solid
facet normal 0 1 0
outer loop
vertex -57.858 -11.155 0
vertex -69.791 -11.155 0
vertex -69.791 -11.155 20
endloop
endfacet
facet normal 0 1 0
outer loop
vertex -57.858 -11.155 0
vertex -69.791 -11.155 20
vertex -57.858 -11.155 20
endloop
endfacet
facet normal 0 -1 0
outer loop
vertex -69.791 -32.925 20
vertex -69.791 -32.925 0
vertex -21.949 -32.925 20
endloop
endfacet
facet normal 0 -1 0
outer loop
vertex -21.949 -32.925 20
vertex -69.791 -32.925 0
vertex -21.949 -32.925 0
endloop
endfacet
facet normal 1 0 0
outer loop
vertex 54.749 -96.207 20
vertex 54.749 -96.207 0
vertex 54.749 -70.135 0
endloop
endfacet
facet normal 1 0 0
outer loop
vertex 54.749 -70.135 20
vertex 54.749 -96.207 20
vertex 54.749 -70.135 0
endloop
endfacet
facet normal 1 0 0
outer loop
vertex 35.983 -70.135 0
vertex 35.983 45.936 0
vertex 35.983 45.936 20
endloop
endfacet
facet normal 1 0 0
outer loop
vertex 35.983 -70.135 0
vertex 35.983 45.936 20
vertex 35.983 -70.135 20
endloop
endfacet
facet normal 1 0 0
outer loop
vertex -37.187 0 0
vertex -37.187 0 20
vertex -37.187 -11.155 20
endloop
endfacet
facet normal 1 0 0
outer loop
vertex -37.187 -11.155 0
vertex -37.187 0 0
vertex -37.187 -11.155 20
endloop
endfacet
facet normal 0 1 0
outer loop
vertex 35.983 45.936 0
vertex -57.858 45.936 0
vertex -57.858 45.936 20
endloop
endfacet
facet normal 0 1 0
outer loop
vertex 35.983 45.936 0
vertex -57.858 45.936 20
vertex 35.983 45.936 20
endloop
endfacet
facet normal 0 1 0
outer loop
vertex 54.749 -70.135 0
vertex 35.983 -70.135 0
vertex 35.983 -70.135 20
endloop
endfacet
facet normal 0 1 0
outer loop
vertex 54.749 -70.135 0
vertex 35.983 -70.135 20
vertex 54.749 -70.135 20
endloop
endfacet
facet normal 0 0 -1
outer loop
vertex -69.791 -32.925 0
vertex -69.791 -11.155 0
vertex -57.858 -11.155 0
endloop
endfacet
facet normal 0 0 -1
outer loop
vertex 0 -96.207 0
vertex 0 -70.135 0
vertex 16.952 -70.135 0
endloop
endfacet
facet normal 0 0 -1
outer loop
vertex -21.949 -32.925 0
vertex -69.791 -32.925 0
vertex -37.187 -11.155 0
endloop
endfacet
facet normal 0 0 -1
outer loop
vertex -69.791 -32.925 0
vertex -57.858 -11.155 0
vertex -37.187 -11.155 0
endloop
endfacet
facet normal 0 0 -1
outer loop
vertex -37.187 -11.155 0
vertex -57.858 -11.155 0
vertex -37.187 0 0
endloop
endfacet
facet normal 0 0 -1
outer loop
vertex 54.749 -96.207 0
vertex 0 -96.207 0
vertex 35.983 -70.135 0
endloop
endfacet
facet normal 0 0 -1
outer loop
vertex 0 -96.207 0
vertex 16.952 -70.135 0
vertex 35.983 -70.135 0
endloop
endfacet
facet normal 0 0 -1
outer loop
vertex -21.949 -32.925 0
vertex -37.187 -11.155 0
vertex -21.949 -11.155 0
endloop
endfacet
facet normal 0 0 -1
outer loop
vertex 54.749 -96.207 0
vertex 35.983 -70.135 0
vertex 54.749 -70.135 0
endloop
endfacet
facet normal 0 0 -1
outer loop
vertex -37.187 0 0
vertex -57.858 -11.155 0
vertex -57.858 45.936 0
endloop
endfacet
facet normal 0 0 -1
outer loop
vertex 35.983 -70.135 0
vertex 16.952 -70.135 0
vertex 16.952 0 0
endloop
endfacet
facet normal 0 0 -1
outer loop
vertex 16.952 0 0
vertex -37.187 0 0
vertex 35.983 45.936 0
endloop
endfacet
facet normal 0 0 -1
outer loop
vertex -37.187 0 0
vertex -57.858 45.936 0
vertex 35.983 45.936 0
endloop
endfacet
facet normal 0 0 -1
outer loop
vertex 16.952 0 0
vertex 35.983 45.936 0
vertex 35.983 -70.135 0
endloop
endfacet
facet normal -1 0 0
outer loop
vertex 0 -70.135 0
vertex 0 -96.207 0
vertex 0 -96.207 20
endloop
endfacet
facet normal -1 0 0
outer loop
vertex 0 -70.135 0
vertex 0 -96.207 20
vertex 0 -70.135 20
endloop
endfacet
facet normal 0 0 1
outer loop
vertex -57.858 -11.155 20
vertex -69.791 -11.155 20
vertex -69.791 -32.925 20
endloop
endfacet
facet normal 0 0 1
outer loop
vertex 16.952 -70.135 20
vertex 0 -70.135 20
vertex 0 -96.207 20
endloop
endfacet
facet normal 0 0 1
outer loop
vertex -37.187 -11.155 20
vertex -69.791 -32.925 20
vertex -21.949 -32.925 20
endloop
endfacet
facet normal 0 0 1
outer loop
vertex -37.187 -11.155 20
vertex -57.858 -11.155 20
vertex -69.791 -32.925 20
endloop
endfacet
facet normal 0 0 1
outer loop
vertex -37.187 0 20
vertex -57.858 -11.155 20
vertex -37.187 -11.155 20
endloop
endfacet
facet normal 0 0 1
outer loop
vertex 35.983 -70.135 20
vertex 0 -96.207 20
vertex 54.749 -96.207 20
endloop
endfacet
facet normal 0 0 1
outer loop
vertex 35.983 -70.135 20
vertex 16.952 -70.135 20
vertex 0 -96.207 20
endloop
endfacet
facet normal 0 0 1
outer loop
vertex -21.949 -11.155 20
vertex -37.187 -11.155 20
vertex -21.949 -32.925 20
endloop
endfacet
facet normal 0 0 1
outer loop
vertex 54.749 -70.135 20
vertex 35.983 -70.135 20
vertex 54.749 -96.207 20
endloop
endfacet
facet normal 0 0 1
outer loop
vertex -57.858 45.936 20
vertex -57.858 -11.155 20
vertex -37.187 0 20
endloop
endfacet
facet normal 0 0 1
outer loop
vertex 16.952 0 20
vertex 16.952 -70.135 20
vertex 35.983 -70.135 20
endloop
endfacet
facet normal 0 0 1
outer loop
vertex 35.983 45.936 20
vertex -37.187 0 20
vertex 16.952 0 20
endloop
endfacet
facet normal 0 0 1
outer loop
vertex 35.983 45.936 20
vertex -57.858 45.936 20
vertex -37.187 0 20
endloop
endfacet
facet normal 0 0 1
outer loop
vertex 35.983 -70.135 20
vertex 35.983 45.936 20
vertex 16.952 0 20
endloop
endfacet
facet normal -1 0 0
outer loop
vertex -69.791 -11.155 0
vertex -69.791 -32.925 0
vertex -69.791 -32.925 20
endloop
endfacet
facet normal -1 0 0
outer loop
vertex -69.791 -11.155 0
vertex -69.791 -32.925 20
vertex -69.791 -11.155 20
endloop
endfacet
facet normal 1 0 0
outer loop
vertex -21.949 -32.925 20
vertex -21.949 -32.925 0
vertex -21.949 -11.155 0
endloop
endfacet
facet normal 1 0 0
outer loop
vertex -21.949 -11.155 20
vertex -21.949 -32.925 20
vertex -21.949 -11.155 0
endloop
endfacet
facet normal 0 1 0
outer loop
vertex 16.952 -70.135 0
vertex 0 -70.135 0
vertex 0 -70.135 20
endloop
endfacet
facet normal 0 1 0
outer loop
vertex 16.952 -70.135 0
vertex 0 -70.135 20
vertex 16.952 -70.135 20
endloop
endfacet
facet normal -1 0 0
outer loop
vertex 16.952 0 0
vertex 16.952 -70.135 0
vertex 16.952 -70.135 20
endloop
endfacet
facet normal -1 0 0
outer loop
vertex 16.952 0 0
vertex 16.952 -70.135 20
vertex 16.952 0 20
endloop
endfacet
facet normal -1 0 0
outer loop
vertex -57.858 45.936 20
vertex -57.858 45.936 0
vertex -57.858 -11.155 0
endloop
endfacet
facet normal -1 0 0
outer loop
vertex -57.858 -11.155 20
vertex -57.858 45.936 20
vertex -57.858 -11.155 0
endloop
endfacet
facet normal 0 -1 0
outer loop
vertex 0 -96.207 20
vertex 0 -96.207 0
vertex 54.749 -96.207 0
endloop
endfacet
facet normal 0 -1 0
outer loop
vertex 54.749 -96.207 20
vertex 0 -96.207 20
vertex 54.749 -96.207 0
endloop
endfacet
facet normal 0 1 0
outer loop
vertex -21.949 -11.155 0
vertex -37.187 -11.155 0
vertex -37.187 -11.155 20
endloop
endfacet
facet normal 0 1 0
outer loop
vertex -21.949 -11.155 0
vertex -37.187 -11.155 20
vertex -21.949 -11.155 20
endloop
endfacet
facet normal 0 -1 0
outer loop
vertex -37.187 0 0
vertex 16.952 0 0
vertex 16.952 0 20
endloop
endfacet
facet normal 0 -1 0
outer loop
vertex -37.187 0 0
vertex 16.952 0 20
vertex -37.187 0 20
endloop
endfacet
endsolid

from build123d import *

# Parameters (mm, degrees)
BOSS_EXTRUDE1_DEPTH = 20
SKETCH3_W           = 47.8415773
SKETCH3_H           = 21.769183321
SKETCH3_W_2         = 54.74945498
SKETCH3_H_2         = 26.072393978
BOSS_EXTRUDE2_DEPTH = 20


with BuildPart() as part:
    # Sketch1 → Boss-Extrude1 (new body)
    with BuildSketch(Plane.XY):
        Polygon((-57.85830676, 0), (-57.85830676, 45.936170213), (35.982726675, 45.936170213), (35.982726675, -85.966261398), (16.952027587, -85.966261398), (16.952027587, 0), (-37.187030164, 0), (-37.187030164, -22.639969605), (-57.85830676, -22.639969605), align=None)
    extrude(amount=BOSS_EXTRUDE1_DEPTH)

    # Sketch3 → Boss-Extrude2 (add)
    with BuildSketch(Plane.XY):
        with Locations((-45.869735372, -22.040085901)):
            Rectangle(SKETCH3_W, SKETCH3_H)
        with Locations((27.37472749, -83.170990229)):
            Rectangle(SKETCH3_W_2, SKETCH3_H_2)
    extrude(amount=BOSS_EXTRUDE2_DEPTH)


solid = part.part
